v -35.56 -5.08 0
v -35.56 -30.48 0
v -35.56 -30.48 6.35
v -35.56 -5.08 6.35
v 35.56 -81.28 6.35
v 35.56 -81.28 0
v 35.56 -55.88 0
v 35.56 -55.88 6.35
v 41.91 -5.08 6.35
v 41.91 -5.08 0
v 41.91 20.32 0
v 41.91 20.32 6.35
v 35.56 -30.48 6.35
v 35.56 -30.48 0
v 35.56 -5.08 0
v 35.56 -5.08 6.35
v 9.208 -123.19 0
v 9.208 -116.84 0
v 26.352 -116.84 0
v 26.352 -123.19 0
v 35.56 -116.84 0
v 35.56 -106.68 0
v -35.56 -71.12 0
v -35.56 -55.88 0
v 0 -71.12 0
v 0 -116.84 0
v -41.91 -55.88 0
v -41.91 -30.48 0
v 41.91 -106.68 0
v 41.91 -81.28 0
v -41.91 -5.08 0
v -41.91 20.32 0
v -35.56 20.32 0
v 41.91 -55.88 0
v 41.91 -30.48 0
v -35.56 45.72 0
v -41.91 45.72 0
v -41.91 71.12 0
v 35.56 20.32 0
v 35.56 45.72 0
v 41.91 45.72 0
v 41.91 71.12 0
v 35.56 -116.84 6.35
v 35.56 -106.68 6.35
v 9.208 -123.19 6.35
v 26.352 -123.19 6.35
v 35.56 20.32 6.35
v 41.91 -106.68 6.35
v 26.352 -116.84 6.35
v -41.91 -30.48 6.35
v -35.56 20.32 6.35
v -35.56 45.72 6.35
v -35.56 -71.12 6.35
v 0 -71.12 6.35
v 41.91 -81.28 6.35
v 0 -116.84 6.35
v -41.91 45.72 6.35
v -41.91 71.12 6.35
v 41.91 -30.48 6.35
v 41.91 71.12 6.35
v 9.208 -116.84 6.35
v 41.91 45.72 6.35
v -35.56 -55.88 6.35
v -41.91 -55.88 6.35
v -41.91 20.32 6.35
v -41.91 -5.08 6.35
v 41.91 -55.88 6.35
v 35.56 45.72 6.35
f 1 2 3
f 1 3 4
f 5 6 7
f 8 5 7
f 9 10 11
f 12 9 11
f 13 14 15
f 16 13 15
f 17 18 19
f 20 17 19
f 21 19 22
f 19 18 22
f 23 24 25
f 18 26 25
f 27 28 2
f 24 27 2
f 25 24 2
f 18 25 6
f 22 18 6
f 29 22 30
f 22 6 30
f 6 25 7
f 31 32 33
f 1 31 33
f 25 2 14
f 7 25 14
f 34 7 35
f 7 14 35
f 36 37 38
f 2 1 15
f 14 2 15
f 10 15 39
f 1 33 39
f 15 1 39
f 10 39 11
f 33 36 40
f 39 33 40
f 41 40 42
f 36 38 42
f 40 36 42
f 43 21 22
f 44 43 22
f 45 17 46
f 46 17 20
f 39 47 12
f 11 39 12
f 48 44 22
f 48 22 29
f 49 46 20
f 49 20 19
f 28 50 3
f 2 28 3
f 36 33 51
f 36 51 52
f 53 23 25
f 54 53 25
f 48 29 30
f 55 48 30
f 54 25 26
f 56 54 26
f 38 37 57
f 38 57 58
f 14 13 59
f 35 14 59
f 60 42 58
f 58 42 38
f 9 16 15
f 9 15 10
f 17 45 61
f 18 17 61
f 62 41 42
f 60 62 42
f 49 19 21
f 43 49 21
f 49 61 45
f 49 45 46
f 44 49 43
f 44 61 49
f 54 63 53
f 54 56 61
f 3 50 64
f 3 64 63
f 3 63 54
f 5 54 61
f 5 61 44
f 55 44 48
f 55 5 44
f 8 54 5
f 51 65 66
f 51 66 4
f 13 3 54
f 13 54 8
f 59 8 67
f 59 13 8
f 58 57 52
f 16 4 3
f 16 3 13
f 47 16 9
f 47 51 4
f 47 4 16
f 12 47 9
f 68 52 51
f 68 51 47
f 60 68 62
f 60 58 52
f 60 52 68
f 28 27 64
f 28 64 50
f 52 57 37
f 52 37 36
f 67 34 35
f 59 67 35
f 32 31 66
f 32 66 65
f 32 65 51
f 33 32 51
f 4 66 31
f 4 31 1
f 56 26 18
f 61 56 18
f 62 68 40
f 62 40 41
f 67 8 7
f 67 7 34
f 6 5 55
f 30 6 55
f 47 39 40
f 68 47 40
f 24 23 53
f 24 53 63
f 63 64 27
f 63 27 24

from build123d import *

# Parameters (mm, degrees)
SKETCH1_W           = 71.12
SKETCH1_H           = 142.24
SKETCH1_W_2         = 17.145
SKETCH1_H_2         = 6.35
SKETCH1_W_3         = 6.35
SKETCH1_H_3         = 25.4
BOSS_EXTRUDE1_DEPTH = 6.35


with BuildPart() as part:
    # Sketch1 → Boss-Extrude1 (new body)
    with BuildSketch(Plane.XY):
        Rectangle(SKETCH1_W, SKETCH1_H)
        Polygon((35.56, -81.28), (35.56, -71.12), (0, -71.12), (0, -116.84), (9.2075, -116.84), (26.3525, -116.84), (35.56, -116.84), (35.56, -106.68), align=None)
        with Locations((17.78, -120.015)):
            Rectangle(SKETCH1_W_2, SKETCH1_H_2)
        with Locations((38.735, 58.42)):
            Rectangle(SKETCH1_W_3, SKETCH1_H_3)
        with Locations((38.735, 7.62)):
            Rectangle(SKETCH1_W_3, SKETCH1_H_3)
        with Locations((38.735, -43.18)):
            Rectangle(SKETCH1_W_3, SKETCH1_H_3)
        with Locations((38.735, -93.98)):
            Rectangle(SKETCH1_W_3, SKETCH1_H_3)
        with Locations((-38.735, -43.18)):
            Rectangle(SKETCH1_W_3, SKETCH1_H_3)
        with Locations((-38.735, 7.62)):
            Rectangle(SKETCH1_W_3, SKETCH1_H_3)
        with Locations((-38.735, 58.42)):
            Rectangle(SKETCH1_W_3, SKETCH1_H_3)
    extrude(amount=BOSS_EXTRUDE1_DEPTH)


solid = part.part
